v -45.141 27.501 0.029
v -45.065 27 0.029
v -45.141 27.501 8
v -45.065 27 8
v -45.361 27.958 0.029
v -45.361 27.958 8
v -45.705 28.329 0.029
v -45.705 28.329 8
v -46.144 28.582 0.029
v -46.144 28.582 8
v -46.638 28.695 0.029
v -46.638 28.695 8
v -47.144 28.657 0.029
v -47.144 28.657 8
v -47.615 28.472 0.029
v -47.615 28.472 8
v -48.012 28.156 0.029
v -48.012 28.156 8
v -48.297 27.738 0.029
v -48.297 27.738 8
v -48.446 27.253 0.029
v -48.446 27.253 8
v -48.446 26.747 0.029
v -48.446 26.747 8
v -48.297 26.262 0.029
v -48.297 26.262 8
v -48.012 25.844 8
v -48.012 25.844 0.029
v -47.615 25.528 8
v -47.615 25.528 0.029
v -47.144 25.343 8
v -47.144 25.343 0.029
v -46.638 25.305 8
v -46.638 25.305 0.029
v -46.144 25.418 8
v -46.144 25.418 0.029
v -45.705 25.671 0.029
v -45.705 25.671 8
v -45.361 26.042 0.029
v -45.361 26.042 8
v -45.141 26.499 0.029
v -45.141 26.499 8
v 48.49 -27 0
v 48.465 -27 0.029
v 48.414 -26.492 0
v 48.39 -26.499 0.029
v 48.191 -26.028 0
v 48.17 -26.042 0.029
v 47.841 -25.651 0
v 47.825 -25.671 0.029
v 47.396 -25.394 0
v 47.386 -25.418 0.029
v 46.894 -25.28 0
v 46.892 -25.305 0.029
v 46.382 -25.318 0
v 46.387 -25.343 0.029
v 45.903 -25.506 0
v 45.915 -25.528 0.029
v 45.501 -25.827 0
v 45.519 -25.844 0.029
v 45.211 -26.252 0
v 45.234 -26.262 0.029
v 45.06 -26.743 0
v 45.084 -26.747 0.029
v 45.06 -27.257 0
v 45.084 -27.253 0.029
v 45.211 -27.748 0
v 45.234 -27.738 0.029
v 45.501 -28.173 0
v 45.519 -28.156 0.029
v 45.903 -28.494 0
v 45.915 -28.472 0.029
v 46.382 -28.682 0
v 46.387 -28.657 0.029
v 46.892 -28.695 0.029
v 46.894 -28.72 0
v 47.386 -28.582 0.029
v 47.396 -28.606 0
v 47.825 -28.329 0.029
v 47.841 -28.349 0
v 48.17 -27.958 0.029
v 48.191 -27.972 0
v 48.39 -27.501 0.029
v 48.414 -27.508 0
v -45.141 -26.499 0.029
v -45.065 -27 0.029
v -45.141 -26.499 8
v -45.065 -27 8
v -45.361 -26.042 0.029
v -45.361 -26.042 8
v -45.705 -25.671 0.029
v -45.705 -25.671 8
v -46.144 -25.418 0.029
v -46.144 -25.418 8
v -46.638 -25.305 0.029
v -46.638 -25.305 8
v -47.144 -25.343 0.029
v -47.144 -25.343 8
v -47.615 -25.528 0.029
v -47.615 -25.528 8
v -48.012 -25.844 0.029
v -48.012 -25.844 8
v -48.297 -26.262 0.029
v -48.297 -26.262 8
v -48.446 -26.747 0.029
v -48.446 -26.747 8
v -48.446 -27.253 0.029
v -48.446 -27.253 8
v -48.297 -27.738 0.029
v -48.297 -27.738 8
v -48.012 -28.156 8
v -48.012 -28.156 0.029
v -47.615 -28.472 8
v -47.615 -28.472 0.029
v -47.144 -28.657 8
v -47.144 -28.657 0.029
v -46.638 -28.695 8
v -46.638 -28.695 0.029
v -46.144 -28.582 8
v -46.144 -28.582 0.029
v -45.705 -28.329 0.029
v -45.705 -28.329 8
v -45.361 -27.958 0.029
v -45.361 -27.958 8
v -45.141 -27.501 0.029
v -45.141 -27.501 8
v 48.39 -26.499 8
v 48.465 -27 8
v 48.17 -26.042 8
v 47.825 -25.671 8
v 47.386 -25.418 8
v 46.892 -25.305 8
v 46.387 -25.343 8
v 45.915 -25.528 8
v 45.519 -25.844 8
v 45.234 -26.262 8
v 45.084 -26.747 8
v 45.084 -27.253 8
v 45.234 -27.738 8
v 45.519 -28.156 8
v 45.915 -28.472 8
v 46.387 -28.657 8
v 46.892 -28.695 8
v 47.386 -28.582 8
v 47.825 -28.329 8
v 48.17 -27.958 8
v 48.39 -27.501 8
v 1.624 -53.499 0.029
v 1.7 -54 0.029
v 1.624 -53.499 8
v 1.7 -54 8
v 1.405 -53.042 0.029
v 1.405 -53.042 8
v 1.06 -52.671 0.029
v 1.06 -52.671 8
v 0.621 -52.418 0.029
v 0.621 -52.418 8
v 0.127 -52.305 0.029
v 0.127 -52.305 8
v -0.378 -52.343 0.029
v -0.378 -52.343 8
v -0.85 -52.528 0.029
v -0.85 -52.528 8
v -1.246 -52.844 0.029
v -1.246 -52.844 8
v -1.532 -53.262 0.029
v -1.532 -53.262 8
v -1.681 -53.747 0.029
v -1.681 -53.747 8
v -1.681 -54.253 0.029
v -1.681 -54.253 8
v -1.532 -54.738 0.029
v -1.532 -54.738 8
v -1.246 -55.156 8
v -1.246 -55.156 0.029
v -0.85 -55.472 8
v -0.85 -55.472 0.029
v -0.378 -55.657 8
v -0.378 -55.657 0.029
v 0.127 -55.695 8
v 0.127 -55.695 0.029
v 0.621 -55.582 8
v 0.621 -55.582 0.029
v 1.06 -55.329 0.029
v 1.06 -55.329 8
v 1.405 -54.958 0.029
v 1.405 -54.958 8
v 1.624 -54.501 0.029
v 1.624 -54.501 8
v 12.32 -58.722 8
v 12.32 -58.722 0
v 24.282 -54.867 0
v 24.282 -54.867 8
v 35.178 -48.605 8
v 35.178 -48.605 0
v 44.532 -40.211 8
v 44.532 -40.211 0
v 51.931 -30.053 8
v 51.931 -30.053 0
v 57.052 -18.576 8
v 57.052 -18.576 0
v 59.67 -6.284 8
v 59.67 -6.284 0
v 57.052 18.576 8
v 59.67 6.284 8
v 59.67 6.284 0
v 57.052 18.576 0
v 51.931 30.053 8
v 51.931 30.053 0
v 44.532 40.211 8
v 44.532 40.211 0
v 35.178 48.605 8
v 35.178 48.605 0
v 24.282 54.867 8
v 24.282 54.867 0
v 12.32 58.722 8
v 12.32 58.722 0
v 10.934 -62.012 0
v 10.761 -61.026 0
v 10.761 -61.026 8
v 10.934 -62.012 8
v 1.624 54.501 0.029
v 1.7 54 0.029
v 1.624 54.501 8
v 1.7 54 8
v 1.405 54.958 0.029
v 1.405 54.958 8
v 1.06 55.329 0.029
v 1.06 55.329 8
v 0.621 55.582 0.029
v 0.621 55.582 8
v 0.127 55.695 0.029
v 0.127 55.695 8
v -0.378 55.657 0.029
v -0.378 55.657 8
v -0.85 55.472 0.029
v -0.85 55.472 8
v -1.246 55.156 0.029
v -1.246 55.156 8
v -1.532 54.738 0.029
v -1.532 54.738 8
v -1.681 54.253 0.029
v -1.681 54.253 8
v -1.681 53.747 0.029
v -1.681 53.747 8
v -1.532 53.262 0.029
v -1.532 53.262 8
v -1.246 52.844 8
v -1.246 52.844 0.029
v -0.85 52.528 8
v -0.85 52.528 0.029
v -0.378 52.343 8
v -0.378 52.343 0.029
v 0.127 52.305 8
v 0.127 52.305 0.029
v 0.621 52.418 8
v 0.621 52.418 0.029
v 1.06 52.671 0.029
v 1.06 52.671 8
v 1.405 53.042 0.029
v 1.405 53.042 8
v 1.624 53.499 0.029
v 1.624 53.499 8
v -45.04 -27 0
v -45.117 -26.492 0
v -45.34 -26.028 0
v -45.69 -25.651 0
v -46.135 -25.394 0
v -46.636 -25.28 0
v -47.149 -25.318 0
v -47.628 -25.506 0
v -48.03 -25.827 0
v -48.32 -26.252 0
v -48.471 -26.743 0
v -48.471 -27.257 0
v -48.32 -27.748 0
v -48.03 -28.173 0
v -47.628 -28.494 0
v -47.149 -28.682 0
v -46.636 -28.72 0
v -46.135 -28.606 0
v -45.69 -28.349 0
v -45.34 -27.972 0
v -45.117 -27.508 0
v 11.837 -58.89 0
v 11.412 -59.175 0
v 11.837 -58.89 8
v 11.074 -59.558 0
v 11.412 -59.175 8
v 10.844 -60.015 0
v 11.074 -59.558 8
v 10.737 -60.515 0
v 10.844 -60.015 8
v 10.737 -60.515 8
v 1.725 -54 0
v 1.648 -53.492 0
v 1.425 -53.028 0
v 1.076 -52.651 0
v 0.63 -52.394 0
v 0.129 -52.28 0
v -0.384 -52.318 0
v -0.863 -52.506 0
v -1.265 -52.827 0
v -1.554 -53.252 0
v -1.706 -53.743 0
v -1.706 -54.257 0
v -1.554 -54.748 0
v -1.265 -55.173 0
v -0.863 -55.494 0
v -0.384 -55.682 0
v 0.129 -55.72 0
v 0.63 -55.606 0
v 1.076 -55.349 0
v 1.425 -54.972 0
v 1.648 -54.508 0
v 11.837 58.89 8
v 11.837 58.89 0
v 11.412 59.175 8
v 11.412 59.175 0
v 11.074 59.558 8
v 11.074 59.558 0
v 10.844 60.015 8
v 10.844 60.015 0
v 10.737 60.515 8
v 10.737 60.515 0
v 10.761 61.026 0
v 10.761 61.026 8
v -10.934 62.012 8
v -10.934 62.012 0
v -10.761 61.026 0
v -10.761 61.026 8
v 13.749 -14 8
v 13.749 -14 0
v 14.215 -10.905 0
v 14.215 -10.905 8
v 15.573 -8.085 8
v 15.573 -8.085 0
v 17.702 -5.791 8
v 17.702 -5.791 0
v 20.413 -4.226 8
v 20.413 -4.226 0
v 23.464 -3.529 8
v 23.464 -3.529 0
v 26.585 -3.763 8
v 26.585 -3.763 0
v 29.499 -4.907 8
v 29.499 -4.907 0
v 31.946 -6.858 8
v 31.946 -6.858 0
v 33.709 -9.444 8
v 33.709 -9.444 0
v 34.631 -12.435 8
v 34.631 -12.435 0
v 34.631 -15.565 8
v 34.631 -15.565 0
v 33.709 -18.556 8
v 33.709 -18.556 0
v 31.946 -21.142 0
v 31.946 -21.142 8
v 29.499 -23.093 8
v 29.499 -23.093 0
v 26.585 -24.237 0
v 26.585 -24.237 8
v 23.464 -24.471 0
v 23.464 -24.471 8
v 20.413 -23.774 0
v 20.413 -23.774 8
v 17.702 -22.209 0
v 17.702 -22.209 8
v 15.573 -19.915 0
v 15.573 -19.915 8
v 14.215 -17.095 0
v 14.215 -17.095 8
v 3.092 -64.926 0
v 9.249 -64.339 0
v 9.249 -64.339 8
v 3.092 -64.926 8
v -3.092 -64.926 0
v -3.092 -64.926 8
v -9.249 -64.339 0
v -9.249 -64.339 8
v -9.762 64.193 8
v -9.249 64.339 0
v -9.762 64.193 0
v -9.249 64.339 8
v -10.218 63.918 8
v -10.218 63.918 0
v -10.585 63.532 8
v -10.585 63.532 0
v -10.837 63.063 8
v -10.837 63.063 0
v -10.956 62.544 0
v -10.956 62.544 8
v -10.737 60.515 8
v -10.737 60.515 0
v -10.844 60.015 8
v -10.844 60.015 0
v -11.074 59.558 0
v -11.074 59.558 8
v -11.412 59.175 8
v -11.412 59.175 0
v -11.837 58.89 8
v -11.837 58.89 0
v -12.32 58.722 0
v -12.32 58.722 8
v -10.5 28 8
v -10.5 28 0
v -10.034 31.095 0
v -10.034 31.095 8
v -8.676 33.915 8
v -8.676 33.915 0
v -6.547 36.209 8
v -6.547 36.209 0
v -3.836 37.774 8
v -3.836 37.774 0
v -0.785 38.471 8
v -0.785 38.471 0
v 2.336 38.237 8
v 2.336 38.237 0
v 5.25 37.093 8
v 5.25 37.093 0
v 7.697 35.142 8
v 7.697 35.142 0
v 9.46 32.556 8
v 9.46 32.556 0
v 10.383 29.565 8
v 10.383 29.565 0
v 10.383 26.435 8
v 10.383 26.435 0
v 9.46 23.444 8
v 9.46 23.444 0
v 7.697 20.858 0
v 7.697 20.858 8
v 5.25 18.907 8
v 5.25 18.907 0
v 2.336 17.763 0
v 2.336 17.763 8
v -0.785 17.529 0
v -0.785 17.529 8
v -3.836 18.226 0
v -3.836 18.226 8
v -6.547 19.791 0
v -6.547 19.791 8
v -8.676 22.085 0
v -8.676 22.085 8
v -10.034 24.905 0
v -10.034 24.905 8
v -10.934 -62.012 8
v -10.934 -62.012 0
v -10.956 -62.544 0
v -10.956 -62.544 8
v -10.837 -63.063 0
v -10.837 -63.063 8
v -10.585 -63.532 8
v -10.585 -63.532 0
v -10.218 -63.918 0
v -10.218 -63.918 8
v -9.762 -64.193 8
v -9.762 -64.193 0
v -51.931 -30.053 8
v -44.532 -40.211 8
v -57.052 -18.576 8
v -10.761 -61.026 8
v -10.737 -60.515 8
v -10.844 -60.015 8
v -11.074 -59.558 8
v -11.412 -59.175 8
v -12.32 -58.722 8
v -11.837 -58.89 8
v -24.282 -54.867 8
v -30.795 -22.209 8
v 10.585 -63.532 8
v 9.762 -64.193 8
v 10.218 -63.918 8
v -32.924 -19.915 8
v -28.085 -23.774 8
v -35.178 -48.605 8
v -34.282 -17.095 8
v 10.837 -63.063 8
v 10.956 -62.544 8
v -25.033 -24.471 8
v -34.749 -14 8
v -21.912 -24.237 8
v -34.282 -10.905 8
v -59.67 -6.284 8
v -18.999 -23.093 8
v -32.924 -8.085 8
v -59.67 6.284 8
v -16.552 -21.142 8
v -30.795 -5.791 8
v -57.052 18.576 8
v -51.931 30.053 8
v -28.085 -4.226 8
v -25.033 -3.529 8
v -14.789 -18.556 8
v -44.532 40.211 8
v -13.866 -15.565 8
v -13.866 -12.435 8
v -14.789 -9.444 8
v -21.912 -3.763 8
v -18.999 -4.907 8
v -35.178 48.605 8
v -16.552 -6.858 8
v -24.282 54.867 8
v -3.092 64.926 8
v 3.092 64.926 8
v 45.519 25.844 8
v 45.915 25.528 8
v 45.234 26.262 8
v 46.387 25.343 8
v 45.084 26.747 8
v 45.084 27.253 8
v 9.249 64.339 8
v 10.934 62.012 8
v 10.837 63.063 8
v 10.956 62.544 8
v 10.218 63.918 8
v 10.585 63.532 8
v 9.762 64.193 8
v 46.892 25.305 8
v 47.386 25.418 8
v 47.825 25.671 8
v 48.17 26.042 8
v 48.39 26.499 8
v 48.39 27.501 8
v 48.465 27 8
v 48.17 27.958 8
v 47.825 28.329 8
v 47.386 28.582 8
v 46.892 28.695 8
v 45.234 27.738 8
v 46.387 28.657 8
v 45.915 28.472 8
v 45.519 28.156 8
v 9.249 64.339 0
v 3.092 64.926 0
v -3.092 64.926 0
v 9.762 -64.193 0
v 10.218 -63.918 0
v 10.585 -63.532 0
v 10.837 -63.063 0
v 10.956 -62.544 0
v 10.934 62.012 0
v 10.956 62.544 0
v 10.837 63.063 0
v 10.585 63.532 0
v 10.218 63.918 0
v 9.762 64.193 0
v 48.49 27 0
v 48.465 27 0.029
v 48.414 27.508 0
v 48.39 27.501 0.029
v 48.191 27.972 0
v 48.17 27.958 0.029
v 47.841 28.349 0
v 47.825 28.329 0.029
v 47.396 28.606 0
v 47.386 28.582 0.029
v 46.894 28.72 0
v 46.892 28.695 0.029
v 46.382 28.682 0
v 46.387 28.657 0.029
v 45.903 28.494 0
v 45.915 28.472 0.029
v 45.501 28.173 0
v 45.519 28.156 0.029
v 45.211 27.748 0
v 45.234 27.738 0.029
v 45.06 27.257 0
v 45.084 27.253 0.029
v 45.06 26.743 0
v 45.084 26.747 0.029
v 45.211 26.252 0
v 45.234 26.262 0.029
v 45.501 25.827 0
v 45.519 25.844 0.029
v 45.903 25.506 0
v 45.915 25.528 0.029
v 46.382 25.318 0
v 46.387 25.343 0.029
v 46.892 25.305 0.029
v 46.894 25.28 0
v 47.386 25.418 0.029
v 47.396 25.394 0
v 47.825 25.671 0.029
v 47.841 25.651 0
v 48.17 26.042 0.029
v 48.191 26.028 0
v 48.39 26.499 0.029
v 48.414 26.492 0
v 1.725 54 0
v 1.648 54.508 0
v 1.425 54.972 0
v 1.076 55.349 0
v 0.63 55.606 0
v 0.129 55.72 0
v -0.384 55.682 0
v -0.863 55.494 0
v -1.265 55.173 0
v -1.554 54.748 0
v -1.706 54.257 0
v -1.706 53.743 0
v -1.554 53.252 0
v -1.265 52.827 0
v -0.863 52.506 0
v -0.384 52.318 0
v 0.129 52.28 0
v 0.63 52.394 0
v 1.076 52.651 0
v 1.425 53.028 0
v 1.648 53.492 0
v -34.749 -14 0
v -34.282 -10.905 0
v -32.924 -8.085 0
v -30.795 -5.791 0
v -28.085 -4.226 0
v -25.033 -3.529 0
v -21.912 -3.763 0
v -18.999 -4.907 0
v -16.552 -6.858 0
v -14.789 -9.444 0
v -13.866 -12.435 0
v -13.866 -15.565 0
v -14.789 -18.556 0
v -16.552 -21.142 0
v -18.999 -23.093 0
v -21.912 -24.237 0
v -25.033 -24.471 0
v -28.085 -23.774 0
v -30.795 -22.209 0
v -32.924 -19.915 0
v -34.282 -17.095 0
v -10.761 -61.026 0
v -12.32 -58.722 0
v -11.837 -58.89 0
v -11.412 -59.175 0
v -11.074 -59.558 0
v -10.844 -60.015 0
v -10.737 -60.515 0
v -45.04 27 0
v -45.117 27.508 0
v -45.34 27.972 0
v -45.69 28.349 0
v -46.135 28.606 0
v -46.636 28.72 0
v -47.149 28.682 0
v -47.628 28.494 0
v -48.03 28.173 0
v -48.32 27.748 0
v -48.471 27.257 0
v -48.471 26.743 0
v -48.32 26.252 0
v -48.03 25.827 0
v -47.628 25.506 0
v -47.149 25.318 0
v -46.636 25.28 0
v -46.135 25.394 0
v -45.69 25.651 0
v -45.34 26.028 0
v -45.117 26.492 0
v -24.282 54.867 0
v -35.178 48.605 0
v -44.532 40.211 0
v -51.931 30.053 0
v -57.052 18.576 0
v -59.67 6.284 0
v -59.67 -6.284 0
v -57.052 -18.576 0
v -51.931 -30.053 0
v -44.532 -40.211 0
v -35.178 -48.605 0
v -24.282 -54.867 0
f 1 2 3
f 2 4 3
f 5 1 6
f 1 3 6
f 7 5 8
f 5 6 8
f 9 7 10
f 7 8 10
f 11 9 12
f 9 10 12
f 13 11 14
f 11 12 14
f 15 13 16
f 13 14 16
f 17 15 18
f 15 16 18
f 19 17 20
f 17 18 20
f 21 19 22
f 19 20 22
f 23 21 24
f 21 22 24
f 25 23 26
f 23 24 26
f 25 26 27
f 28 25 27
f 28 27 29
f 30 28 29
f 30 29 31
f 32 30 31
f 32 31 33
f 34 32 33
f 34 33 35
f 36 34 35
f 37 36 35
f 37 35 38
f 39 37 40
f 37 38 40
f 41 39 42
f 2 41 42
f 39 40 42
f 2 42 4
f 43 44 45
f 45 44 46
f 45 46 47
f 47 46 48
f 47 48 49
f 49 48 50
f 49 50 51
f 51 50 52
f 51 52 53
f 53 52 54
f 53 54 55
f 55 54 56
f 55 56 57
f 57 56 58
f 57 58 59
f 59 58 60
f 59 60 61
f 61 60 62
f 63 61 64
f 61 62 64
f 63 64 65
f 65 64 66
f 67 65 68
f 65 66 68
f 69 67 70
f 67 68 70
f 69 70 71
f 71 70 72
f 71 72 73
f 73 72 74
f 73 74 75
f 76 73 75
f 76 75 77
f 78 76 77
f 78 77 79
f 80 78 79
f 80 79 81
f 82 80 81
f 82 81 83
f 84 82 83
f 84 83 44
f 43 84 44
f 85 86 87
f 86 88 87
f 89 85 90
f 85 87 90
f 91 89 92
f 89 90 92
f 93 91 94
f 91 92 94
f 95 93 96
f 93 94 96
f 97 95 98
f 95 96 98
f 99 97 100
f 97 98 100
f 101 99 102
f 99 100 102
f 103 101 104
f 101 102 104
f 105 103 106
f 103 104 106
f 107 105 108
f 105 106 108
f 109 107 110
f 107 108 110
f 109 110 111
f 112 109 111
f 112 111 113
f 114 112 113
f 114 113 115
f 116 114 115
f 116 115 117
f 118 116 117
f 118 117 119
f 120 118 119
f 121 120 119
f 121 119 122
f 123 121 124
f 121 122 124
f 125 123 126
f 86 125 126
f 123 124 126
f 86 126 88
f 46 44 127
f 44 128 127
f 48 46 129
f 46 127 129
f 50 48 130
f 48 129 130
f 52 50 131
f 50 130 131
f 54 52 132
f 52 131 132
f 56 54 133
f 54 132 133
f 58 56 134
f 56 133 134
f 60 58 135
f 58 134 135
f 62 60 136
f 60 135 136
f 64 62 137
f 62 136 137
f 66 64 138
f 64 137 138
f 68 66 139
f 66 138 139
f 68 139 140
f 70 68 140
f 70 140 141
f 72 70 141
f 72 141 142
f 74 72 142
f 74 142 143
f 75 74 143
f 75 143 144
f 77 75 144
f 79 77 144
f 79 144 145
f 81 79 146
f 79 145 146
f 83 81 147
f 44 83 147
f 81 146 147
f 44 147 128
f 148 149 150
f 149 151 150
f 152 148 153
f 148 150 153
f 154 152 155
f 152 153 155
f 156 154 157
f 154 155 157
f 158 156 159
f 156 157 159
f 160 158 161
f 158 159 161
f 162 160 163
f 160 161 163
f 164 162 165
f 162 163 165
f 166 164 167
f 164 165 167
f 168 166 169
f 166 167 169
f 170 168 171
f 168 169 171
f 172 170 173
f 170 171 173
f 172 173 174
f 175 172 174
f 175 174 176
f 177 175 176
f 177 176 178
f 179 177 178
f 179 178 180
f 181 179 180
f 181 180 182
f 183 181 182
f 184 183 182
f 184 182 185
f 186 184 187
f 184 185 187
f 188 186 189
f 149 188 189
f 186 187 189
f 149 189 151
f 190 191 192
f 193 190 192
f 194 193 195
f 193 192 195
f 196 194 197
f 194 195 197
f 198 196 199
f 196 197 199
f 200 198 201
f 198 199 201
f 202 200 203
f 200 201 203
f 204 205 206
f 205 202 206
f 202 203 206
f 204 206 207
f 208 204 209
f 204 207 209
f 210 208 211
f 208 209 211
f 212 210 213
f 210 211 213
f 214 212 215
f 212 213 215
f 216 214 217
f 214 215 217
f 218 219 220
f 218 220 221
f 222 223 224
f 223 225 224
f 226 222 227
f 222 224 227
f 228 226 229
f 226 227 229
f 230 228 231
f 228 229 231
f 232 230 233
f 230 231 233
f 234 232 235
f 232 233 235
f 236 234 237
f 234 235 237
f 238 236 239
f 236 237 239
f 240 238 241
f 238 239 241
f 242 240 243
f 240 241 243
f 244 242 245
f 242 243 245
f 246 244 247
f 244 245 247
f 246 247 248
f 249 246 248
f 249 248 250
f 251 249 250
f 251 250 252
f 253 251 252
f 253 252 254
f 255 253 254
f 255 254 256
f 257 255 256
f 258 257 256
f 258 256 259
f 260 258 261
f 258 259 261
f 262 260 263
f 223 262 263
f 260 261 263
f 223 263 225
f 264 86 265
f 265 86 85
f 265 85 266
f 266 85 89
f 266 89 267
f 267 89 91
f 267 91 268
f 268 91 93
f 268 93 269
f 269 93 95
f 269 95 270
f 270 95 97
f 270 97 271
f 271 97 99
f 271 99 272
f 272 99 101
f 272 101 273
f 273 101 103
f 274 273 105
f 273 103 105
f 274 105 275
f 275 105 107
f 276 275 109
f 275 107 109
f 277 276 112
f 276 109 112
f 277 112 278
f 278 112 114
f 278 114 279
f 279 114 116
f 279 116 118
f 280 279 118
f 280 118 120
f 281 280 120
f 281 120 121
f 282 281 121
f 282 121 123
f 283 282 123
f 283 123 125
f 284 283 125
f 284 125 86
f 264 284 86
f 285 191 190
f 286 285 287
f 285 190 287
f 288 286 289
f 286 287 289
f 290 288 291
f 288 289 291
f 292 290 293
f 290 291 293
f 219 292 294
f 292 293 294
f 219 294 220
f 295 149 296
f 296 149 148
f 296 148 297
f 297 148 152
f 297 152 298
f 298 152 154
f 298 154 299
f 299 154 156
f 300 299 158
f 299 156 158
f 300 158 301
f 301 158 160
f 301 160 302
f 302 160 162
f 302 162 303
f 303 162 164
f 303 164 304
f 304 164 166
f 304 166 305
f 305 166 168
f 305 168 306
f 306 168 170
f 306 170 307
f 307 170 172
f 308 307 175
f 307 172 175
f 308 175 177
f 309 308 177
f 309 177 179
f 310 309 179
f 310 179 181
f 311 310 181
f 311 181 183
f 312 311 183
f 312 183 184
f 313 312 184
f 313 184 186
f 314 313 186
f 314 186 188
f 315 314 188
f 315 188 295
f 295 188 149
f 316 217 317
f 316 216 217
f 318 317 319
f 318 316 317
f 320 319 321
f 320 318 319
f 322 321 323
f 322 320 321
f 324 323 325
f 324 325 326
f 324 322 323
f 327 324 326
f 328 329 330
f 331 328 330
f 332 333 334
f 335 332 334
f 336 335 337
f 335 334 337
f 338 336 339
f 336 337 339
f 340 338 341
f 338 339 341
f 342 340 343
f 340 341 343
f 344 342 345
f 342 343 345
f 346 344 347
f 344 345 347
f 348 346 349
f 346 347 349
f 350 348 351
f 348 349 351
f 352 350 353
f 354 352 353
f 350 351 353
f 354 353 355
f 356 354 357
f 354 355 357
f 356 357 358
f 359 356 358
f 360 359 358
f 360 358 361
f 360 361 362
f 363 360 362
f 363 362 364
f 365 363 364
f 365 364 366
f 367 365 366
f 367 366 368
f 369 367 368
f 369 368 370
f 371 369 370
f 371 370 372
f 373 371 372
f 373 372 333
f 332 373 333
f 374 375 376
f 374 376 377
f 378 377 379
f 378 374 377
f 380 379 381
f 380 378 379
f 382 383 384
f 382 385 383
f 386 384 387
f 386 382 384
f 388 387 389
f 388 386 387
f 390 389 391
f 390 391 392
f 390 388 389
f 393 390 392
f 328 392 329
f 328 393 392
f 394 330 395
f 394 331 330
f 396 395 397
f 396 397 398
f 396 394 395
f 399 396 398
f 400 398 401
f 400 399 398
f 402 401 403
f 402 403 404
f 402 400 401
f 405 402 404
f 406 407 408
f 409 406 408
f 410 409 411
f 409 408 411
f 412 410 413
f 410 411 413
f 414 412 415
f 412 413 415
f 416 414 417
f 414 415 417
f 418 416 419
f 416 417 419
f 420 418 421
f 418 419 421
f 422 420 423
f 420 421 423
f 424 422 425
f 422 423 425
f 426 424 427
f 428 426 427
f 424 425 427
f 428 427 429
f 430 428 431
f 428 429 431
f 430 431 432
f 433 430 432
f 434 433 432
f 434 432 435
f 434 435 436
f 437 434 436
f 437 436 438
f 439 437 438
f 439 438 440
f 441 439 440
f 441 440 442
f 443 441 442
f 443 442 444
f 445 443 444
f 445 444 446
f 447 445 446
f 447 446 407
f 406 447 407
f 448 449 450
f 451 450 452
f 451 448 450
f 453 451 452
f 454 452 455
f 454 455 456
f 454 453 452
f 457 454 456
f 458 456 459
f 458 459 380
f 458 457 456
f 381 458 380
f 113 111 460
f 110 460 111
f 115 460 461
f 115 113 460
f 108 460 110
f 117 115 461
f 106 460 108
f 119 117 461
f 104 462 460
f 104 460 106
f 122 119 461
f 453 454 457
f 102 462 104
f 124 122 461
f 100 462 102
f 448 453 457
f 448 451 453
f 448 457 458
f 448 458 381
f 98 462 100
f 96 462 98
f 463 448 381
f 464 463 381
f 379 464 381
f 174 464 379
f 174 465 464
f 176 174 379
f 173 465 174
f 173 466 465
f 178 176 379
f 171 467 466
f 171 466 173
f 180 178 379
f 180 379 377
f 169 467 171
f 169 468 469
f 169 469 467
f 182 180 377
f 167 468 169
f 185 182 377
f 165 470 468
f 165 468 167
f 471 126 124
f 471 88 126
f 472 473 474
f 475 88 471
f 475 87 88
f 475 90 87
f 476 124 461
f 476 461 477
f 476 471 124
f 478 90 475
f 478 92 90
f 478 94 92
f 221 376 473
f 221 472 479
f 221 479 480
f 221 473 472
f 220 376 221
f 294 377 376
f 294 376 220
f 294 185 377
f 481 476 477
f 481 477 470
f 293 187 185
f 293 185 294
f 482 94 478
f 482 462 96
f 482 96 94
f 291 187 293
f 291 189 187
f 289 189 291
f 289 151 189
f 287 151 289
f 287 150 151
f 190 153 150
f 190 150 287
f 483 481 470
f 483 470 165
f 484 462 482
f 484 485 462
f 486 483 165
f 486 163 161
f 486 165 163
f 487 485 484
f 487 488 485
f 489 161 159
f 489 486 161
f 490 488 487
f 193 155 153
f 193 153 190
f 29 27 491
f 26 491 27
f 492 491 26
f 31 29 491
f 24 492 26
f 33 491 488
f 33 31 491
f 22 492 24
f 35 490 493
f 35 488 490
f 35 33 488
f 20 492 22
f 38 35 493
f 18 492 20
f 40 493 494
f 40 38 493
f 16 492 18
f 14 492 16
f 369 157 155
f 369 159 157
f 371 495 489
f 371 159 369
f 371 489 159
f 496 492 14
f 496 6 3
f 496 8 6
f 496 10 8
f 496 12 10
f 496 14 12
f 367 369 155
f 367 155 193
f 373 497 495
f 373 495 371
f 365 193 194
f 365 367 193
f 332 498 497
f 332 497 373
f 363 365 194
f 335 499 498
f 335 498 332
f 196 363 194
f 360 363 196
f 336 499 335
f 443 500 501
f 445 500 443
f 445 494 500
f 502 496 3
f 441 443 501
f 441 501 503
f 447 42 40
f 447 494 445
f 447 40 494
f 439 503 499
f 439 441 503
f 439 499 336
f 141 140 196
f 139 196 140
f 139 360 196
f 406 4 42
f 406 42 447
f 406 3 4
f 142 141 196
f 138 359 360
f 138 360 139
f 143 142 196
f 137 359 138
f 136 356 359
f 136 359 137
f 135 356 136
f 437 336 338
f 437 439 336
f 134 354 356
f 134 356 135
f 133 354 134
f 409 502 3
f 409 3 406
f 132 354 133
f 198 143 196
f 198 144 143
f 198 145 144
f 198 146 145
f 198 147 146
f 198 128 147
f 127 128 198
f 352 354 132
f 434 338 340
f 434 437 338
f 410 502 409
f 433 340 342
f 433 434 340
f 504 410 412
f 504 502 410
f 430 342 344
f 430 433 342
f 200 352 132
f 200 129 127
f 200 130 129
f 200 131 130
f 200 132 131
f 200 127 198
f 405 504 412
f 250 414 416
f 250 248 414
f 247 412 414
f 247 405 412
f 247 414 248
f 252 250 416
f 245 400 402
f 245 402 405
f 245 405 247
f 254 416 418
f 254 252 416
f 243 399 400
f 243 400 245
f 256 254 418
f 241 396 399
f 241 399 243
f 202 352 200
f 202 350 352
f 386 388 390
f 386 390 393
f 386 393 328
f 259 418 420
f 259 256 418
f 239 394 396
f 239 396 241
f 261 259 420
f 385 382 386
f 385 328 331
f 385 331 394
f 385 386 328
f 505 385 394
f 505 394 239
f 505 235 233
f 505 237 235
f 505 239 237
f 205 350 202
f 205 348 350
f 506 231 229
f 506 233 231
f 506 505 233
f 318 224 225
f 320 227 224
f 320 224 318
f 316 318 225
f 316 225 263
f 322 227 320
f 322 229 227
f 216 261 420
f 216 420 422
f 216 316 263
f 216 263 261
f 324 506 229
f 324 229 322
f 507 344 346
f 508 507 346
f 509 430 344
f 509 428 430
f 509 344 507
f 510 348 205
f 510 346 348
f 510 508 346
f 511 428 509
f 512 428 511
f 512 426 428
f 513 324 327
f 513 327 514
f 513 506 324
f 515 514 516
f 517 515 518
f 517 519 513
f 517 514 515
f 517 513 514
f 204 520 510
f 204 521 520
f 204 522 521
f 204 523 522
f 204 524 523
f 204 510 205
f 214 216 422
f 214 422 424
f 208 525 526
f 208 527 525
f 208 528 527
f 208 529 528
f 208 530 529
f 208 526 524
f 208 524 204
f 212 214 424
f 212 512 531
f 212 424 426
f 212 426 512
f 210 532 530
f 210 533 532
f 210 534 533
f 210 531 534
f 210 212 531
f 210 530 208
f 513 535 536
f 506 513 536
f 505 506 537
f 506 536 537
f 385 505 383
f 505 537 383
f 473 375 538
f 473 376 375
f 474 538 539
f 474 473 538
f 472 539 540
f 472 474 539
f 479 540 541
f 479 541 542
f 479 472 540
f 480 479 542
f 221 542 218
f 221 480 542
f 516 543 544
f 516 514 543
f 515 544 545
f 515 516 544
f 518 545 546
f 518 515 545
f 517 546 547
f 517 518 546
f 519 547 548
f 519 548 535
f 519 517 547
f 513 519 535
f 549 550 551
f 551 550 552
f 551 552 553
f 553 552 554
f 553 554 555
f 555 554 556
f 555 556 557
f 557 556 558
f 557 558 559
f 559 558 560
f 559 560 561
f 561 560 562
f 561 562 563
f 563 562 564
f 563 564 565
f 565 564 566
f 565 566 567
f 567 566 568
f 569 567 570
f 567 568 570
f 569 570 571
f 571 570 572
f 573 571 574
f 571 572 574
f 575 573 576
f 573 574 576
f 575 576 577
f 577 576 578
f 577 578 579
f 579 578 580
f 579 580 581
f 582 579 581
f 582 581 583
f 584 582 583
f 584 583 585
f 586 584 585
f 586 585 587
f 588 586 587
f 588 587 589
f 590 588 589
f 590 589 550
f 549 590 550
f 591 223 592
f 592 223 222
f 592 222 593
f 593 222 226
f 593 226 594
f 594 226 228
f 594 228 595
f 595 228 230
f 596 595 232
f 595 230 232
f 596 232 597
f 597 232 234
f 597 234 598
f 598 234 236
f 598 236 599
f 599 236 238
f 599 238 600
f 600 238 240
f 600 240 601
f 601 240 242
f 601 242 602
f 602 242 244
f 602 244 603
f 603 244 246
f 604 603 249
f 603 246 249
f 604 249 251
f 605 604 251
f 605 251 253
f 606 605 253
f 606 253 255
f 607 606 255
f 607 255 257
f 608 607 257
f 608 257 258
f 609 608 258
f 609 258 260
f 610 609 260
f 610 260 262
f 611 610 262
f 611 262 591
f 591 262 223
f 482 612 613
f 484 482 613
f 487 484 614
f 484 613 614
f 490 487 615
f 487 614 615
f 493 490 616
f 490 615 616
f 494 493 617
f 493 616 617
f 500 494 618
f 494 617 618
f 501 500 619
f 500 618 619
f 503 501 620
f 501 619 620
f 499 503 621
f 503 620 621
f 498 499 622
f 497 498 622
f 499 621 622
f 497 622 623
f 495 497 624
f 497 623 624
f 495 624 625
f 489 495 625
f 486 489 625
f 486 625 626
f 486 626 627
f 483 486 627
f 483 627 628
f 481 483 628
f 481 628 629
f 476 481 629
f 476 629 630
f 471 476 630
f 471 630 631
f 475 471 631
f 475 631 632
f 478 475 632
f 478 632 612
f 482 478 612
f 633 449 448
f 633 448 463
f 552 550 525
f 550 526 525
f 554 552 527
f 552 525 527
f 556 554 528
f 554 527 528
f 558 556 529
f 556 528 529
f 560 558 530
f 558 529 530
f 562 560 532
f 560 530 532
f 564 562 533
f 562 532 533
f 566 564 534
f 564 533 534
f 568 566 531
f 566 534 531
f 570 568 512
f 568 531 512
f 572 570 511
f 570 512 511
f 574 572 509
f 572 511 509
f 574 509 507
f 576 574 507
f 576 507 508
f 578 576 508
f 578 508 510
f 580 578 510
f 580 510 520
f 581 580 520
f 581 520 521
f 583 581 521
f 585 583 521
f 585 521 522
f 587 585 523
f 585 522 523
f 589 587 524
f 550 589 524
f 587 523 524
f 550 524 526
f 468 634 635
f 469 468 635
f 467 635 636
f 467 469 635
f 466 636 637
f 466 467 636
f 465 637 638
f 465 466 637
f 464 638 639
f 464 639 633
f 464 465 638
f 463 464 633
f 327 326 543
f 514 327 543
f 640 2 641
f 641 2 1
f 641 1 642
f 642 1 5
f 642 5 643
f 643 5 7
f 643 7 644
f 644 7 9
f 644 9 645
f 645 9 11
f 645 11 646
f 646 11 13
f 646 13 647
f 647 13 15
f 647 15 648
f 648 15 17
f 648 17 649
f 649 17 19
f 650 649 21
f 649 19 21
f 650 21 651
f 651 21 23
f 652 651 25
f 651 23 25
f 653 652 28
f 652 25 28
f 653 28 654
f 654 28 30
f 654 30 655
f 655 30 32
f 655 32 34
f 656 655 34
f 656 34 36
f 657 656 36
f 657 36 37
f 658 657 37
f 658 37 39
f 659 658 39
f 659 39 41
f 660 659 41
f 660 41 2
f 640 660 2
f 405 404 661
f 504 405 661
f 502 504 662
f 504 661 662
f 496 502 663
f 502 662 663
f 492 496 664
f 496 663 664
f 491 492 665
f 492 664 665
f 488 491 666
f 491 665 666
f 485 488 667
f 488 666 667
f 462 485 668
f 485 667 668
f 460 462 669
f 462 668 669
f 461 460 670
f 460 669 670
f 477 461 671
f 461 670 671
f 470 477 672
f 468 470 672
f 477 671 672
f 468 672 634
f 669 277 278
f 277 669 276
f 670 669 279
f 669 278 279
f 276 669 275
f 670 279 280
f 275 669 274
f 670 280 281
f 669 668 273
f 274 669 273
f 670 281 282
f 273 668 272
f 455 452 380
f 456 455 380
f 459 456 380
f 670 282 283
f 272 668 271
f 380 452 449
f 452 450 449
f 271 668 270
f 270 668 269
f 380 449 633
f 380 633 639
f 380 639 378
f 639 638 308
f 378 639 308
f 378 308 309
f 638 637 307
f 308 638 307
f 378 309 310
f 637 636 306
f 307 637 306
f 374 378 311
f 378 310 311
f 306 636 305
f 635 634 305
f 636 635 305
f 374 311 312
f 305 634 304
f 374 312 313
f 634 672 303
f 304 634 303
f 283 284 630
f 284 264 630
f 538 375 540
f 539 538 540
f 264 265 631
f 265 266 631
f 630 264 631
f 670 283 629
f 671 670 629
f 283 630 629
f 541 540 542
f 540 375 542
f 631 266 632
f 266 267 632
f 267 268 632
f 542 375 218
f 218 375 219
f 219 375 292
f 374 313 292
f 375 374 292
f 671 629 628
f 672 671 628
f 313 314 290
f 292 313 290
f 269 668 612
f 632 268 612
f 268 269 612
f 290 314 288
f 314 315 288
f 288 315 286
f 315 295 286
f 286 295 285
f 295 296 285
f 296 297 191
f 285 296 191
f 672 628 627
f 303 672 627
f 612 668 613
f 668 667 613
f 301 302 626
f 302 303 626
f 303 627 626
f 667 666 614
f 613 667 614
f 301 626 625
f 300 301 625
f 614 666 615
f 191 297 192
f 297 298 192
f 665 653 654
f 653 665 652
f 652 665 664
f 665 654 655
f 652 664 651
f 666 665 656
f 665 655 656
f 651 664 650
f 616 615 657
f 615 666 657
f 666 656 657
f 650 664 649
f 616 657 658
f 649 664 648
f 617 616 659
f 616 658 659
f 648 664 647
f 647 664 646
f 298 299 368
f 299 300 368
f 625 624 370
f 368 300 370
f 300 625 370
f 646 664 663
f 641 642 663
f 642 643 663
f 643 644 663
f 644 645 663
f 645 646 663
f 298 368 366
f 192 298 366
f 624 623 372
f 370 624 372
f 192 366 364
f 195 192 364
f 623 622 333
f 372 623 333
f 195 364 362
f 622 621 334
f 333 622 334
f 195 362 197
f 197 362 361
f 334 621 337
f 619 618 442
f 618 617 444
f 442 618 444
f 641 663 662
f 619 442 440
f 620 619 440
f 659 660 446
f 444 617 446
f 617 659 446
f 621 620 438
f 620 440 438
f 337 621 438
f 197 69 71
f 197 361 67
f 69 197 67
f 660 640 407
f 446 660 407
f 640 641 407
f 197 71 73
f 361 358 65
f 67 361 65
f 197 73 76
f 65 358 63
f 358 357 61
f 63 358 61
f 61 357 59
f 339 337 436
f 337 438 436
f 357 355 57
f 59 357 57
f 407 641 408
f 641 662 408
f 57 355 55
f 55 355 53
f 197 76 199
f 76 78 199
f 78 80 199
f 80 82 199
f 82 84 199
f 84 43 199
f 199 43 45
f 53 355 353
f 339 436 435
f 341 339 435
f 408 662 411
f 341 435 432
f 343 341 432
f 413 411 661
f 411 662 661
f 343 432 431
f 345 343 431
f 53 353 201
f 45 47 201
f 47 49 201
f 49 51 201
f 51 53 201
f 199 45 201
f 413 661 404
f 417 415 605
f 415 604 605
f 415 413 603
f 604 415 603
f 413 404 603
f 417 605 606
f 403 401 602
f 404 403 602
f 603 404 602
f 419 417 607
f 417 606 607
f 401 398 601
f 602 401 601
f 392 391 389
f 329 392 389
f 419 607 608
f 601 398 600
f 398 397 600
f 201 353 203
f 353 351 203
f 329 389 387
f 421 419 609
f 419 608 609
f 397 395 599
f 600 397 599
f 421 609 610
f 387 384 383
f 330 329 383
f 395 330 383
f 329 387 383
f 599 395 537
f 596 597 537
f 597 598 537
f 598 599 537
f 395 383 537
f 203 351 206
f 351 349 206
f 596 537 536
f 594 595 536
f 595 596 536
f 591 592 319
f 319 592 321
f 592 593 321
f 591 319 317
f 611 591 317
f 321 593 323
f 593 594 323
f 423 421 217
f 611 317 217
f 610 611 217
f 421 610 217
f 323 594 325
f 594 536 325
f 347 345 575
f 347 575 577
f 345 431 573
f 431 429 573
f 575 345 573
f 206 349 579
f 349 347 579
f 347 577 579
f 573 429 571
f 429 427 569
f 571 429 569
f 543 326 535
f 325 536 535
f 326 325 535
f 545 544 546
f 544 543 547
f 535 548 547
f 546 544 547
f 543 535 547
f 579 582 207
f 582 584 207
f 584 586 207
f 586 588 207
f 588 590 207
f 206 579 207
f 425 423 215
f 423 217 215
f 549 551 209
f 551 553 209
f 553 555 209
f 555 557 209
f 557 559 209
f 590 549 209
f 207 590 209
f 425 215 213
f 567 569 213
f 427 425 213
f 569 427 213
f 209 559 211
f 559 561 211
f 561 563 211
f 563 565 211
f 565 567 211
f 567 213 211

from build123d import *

# Parameters (mm, degrees)
SKETCH_1_R                   = 60
EXTRUDE_1_DEPTH              = 8
EXTRUDE_START                = -8
EXTRUDE_2_DEPTH              = 8
FILLET_1_R                   = 2
HOLE_WIZARD_M3_1_D           = 3.4
HOLE_WIZARD_M3_1_CSINK_D     = 3.45
HOLE_WIZARD_M3_1_CSINK_ANGLE = 82
SKETCH_8_R                   = 10.5
CUT_EXTRUDE_1_DEPTH          = 89.820042783


with BuildPart() as part:
    # ｽｹｯﾁ1 → ﾎﾞｽ - 押し出し1 (new body)
    with BuildSketch(Plane.XY):
        Circle(SKETCH_1_R)
    extrude(amount=EXTRUDE_1_DEPTH)

    # ｽｹｯﾁ2 → ﾎﾞｽ - 押し出し2 (add)
    with BuildSketch(Plane.XY.offset(8).offset(EXTRUDE_START)):
        with BuildLine():
            Line((10.41889066, 59.088465181), (11.287131548, 64.012503946))
            ThreePointArc((11.287131548, 64.012503946), (0, 65), (-11.287131548, 64.012503946))
            Line((-11.287131548, 64.012503946), (-10.41889066, 59.088465181))
            ThreePointArc((-10.41889066, 59.088465181), (0, 60), (10.41889066, 59.088465181))
        make_face()
        with BuildLine():
            Line((10.41889066, -59.088465181), (11.287131548, -64.012503946))
            ThreePointArc((11.287131548, -64.012503946), (0, -65), (-11.287131548, -64.012503946))
            Line((-11.287131548, -64.012503946), (-10.41889066, -59.088465181))
            ThreePointArc((-10.41889066, -59.088465181), (0, -60), (10.41889066, -59.088465181))
        make_face()
    extrude(amount=EXTRUDE_2_DEPTH)

    # ﾌｨﾚｯﾄ1
    fillet_1_edges = [part.edges().sort_by_distance(p)[0] for p in [
        (-10.41889066, -59.088465181, 4),
        (10.41889066, -59.088465181, 4),
        (11.287131548, -64.012503946, 4),
        (-11.287131548, -64.012503946, 4),
        (10.41889066, 59.088465181, 4),
        (-10.41889066, 59.088465181, 4),
        (-11.287131548, 64.012503946, 4),
        (11.287131548, 64.012503946, 4),
    ]]
    fillet(fillet_1_edges, radius=FILLET_1_R)

    # M3 すきま穴1 (through all)
    with Locations(Plane(origin=(0, 0, 0), x_dir=(-1, 0, 0), z_dir=(0, 0, -1))):
        with Locations((0, 54), (46.765371804, 27), (46.765371804, -27), (0, -54), (-46.765371804, -27), (-46.765371804, 27)):
            CounterSinkHole(HOLE_WIZARD_M3_1_D / 2, HOLE_WIZARD_M3_1_CSINK_D / 2, counter_sink_angle=HOLE_WIZARD_M3_1_CSINK_ANGLE)

    # ｽｹｯﾁ8 → ｶｯﾄ - 押し出し1 (cut, through all)
    with BuildSketch(Plane(origin=(0, 0, 0), x_dir=(-1, 0, 0), z_dir=(0, 0, -1))):
        with Locations((0, 28)):
            Circle(SKETCH_8_R)
        with Locations((24.248711306, -14)):
            Circle(SKETCH_8_R)
        with Locations((-24.248711306, -14)):
            Circle(SKETCH_8_R)
    extrude(amount=-CUT_EXTRUDE_1_DEPTH, mode=Mode.SUBTRACT)


solid = part.part
